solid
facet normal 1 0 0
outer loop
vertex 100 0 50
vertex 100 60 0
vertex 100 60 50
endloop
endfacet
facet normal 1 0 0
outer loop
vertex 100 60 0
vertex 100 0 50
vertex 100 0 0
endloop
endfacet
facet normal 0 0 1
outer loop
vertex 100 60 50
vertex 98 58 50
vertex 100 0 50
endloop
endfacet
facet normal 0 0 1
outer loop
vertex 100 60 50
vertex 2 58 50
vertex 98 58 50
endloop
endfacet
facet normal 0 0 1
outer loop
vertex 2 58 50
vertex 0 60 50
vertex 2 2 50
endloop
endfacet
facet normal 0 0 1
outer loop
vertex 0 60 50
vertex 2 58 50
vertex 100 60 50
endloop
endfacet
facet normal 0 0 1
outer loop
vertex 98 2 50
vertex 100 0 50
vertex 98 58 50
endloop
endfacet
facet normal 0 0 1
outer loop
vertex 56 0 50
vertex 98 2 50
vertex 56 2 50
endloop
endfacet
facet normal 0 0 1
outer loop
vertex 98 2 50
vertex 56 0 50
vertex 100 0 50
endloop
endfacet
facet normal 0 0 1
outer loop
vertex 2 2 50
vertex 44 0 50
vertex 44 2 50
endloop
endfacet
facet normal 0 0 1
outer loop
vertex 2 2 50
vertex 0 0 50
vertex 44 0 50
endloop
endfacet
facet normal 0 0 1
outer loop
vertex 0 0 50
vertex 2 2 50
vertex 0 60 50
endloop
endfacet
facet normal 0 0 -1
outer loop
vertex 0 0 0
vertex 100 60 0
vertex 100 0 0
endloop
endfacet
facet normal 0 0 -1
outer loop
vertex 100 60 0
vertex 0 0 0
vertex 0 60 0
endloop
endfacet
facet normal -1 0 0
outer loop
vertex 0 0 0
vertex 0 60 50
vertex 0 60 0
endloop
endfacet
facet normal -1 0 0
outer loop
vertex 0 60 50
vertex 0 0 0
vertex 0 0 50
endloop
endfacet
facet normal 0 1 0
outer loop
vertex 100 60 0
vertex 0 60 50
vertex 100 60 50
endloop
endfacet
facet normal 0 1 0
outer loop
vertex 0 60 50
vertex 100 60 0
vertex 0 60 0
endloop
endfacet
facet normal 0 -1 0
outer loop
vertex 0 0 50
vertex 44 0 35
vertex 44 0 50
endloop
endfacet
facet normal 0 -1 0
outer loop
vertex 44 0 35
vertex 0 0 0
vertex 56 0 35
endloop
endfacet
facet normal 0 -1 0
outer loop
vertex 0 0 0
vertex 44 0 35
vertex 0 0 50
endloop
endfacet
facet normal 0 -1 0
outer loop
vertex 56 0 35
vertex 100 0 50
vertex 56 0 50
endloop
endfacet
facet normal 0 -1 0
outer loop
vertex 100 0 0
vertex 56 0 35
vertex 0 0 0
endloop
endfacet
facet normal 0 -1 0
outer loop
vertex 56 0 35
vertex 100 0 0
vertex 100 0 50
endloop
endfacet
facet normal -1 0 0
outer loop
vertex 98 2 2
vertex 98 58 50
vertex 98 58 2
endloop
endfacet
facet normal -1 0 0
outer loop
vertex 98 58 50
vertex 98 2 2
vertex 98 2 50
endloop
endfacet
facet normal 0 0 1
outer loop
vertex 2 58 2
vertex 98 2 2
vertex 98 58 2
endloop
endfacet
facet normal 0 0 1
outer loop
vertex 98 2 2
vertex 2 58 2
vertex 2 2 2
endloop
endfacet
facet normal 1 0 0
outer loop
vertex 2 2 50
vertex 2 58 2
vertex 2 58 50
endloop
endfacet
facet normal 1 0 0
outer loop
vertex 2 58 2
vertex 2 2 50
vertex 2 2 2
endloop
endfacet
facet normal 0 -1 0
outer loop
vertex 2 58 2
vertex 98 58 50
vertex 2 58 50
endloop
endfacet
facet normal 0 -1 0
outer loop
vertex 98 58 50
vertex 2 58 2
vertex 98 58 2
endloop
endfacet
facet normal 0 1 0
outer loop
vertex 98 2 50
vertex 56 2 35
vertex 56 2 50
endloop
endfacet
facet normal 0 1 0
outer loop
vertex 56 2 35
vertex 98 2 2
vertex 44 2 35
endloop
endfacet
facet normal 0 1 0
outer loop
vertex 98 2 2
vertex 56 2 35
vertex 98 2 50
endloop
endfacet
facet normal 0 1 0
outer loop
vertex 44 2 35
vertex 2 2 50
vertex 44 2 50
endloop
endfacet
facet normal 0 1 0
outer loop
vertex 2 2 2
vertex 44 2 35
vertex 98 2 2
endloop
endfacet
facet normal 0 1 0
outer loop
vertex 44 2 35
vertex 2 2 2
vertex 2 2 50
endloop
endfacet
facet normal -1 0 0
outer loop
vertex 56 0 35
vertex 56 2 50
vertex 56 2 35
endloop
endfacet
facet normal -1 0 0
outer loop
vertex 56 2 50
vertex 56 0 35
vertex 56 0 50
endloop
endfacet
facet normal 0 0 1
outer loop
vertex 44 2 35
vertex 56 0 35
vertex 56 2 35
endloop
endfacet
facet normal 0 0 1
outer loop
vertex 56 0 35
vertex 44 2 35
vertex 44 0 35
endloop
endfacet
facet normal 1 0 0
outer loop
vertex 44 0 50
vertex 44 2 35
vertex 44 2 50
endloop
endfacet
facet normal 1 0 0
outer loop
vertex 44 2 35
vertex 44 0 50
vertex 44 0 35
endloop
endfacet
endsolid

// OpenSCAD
$fn = 32;

// ----------------------------------------------------------------------
// Enclosure box: notch enclosure
// ----------------------------------------------------------------------

// --- parameters (mm) ---
box_l = 100;              // outer length, X
box_w = 60;               // outer width, Y
box_h = 50;               // outer height
wall_t = 2;               // wall thickness
notch_w = 12;             // cable notch width
notch_h = 15;             // cable notch height

inner_h = box_h - wall_t;  // cavity depth
boss_h = inner_h - 2;  // corner boss height

difference() {
  cube([box_l, box_w, box_h]);
  translate([wall_t, wall_t, wall_t])
    cube([box_l - 2 * wall_t, box_w - 2 * wall_t, box_h]);
  translate([box_l / 2 - notch_w / 2, -1, box_h - notch_h])
    cube([notch_w, wall_t + 2, notch_h + 1]);
}
